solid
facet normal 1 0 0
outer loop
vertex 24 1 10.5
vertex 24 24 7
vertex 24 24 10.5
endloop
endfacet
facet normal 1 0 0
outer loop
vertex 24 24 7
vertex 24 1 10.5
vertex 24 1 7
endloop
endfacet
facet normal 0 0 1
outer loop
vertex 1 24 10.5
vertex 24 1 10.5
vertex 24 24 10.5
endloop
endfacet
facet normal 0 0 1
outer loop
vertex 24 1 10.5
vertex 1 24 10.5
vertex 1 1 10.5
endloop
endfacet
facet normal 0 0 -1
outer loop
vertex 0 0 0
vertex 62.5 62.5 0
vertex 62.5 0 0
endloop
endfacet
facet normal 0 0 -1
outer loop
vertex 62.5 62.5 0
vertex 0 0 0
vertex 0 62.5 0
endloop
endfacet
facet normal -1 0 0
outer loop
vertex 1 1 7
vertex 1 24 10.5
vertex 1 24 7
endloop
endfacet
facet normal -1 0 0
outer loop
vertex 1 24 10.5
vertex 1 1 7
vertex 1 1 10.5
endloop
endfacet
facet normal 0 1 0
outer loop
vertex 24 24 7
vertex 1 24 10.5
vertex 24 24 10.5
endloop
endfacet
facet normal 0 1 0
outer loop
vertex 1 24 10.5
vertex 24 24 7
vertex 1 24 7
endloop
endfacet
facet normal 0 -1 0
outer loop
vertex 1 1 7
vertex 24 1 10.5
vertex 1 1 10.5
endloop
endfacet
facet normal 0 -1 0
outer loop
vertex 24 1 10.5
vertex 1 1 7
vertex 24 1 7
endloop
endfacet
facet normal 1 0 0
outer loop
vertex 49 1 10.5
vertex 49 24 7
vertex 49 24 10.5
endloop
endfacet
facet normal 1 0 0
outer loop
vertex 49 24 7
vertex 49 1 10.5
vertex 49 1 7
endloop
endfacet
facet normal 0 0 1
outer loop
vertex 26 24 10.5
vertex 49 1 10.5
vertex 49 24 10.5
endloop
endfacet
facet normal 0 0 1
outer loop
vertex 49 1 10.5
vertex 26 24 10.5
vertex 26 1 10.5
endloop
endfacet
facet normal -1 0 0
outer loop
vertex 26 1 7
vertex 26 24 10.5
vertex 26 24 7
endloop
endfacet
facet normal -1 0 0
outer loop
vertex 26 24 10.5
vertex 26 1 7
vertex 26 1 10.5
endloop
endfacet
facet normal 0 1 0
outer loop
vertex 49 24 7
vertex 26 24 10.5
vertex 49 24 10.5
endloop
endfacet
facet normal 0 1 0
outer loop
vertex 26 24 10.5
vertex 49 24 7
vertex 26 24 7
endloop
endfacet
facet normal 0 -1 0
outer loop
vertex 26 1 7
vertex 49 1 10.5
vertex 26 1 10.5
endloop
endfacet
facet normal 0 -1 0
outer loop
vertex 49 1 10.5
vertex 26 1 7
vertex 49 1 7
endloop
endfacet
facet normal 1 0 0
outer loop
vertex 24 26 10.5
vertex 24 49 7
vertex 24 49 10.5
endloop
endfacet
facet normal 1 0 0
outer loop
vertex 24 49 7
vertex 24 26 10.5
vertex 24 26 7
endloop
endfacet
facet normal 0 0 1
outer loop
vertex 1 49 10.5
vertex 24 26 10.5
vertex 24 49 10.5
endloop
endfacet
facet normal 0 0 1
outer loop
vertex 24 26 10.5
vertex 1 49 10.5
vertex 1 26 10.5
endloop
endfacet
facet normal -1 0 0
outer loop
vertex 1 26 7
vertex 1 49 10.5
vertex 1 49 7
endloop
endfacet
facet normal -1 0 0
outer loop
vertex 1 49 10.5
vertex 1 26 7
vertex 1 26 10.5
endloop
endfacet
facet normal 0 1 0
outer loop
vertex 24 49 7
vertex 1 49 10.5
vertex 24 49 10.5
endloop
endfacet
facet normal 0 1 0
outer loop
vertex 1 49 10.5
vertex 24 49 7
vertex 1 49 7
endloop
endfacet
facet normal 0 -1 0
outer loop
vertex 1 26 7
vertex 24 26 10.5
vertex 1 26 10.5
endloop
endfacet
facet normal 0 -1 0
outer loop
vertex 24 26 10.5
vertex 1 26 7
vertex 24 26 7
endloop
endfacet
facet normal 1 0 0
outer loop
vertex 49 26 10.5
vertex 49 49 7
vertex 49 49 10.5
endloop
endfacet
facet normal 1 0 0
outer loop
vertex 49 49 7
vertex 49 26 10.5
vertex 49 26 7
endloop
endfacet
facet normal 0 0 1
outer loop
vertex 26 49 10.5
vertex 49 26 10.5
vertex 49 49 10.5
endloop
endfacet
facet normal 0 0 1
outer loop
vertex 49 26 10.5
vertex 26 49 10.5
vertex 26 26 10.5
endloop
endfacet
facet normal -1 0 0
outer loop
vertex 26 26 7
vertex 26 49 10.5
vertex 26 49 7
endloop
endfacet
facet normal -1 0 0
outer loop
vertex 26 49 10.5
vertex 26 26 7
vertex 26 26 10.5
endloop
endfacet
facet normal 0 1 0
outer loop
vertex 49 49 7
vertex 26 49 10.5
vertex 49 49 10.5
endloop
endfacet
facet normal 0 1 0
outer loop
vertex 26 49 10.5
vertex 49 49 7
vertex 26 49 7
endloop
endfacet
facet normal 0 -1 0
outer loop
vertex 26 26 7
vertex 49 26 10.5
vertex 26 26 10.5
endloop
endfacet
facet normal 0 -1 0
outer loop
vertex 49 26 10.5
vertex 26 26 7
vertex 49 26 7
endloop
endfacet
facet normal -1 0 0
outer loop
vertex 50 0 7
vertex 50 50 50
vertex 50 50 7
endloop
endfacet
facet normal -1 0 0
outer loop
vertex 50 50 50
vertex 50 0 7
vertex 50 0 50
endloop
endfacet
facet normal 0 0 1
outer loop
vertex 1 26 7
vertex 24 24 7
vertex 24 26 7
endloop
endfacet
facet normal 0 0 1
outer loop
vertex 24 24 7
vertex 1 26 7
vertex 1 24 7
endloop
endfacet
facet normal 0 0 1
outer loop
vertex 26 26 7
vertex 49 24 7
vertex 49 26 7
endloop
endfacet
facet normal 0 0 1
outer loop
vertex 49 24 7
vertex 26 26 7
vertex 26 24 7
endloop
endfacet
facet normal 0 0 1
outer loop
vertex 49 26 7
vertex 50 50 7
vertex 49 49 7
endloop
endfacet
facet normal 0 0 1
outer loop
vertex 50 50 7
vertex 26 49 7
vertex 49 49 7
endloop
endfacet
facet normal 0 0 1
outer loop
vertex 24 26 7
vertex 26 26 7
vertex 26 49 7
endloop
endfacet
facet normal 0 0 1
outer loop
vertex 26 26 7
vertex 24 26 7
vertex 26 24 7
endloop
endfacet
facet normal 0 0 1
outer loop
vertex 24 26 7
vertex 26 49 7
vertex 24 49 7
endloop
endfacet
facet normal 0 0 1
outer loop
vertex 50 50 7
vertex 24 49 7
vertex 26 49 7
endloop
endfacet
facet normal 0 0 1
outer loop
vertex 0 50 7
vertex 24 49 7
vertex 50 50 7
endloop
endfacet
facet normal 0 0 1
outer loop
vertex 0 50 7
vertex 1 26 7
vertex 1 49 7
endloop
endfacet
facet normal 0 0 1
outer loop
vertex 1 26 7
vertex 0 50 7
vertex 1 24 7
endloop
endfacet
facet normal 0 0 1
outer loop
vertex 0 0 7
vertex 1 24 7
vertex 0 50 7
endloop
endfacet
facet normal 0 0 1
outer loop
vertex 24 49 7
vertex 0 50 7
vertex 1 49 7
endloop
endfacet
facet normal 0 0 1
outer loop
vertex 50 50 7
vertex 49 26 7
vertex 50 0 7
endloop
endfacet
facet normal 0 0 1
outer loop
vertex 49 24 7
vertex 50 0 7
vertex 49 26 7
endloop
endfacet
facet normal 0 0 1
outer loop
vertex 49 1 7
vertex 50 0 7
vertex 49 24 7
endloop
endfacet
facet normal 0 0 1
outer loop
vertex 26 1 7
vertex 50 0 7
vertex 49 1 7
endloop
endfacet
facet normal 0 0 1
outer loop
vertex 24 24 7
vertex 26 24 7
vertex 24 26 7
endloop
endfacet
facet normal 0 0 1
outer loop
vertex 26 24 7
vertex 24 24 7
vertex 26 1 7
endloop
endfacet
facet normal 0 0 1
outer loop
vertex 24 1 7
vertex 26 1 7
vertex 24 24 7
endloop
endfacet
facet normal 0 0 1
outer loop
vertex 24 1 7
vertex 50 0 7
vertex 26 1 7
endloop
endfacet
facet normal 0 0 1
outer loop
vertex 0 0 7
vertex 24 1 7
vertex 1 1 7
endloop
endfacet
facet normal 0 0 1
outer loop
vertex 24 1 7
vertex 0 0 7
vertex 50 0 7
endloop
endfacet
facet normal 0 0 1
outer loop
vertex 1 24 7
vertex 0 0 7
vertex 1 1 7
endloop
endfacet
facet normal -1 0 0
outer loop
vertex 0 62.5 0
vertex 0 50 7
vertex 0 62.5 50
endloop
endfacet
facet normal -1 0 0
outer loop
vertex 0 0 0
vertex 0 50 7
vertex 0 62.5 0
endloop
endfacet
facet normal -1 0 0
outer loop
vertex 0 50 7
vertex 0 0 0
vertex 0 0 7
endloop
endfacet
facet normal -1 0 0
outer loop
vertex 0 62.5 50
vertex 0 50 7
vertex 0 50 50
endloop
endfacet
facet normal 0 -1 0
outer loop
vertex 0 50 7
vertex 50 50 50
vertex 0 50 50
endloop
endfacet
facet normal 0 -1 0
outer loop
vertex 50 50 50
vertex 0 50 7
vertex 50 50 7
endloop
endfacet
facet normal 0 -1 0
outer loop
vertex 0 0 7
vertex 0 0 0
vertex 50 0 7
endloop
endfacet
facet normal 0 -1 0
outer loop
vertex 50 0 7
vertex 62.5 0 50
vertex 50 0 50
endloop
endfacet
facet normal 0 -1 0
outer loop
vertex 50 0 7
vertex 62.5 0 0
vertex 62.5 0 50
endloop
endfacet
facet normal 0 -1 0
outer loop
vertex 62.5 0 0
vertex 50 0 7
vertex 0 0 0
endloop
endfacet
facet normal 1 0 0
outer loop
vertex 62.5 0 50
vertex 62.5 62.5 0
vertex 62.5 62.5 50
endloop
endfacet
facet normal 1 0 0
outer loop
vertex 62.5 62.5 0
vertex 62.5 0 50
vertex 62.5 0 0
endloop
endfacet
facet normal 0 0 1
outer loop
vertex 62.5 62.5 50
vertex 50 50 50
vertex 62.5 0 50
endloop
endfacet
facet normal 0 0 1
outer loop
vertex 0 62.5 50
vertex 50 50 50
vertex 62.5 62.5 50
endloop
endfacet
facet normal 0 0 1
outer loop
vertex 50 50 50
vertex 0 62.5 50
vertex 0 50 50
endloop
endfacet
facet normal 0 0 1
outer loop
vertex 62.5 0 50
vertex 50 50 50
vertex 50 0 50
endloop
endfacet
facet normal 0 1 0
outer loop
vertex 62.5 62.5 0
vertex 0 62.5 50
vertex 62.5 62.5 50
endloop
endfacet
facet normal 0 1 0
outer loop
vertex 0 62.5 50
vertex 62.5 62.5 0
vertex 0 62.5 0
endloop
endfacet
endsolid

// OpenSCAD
color("LightGray") {
    translate([1,1,0]) cube([23,23,6+4.5]);
    translate([25+1,1,0]) cube([23,23,6+4.5]);
    translate([1,25+1,0]) cube([23,23,6+4.5]);
    translate([25+1,25+1,0]) cube([23,23,6+4.5]);
}
color("Grey") {
    cube([50,50,7]);
    translate([0,50,0]) cube([50+12.5,12.5,50]);
    translate([50,0,0]) cube([12.5,50,50]);
}
